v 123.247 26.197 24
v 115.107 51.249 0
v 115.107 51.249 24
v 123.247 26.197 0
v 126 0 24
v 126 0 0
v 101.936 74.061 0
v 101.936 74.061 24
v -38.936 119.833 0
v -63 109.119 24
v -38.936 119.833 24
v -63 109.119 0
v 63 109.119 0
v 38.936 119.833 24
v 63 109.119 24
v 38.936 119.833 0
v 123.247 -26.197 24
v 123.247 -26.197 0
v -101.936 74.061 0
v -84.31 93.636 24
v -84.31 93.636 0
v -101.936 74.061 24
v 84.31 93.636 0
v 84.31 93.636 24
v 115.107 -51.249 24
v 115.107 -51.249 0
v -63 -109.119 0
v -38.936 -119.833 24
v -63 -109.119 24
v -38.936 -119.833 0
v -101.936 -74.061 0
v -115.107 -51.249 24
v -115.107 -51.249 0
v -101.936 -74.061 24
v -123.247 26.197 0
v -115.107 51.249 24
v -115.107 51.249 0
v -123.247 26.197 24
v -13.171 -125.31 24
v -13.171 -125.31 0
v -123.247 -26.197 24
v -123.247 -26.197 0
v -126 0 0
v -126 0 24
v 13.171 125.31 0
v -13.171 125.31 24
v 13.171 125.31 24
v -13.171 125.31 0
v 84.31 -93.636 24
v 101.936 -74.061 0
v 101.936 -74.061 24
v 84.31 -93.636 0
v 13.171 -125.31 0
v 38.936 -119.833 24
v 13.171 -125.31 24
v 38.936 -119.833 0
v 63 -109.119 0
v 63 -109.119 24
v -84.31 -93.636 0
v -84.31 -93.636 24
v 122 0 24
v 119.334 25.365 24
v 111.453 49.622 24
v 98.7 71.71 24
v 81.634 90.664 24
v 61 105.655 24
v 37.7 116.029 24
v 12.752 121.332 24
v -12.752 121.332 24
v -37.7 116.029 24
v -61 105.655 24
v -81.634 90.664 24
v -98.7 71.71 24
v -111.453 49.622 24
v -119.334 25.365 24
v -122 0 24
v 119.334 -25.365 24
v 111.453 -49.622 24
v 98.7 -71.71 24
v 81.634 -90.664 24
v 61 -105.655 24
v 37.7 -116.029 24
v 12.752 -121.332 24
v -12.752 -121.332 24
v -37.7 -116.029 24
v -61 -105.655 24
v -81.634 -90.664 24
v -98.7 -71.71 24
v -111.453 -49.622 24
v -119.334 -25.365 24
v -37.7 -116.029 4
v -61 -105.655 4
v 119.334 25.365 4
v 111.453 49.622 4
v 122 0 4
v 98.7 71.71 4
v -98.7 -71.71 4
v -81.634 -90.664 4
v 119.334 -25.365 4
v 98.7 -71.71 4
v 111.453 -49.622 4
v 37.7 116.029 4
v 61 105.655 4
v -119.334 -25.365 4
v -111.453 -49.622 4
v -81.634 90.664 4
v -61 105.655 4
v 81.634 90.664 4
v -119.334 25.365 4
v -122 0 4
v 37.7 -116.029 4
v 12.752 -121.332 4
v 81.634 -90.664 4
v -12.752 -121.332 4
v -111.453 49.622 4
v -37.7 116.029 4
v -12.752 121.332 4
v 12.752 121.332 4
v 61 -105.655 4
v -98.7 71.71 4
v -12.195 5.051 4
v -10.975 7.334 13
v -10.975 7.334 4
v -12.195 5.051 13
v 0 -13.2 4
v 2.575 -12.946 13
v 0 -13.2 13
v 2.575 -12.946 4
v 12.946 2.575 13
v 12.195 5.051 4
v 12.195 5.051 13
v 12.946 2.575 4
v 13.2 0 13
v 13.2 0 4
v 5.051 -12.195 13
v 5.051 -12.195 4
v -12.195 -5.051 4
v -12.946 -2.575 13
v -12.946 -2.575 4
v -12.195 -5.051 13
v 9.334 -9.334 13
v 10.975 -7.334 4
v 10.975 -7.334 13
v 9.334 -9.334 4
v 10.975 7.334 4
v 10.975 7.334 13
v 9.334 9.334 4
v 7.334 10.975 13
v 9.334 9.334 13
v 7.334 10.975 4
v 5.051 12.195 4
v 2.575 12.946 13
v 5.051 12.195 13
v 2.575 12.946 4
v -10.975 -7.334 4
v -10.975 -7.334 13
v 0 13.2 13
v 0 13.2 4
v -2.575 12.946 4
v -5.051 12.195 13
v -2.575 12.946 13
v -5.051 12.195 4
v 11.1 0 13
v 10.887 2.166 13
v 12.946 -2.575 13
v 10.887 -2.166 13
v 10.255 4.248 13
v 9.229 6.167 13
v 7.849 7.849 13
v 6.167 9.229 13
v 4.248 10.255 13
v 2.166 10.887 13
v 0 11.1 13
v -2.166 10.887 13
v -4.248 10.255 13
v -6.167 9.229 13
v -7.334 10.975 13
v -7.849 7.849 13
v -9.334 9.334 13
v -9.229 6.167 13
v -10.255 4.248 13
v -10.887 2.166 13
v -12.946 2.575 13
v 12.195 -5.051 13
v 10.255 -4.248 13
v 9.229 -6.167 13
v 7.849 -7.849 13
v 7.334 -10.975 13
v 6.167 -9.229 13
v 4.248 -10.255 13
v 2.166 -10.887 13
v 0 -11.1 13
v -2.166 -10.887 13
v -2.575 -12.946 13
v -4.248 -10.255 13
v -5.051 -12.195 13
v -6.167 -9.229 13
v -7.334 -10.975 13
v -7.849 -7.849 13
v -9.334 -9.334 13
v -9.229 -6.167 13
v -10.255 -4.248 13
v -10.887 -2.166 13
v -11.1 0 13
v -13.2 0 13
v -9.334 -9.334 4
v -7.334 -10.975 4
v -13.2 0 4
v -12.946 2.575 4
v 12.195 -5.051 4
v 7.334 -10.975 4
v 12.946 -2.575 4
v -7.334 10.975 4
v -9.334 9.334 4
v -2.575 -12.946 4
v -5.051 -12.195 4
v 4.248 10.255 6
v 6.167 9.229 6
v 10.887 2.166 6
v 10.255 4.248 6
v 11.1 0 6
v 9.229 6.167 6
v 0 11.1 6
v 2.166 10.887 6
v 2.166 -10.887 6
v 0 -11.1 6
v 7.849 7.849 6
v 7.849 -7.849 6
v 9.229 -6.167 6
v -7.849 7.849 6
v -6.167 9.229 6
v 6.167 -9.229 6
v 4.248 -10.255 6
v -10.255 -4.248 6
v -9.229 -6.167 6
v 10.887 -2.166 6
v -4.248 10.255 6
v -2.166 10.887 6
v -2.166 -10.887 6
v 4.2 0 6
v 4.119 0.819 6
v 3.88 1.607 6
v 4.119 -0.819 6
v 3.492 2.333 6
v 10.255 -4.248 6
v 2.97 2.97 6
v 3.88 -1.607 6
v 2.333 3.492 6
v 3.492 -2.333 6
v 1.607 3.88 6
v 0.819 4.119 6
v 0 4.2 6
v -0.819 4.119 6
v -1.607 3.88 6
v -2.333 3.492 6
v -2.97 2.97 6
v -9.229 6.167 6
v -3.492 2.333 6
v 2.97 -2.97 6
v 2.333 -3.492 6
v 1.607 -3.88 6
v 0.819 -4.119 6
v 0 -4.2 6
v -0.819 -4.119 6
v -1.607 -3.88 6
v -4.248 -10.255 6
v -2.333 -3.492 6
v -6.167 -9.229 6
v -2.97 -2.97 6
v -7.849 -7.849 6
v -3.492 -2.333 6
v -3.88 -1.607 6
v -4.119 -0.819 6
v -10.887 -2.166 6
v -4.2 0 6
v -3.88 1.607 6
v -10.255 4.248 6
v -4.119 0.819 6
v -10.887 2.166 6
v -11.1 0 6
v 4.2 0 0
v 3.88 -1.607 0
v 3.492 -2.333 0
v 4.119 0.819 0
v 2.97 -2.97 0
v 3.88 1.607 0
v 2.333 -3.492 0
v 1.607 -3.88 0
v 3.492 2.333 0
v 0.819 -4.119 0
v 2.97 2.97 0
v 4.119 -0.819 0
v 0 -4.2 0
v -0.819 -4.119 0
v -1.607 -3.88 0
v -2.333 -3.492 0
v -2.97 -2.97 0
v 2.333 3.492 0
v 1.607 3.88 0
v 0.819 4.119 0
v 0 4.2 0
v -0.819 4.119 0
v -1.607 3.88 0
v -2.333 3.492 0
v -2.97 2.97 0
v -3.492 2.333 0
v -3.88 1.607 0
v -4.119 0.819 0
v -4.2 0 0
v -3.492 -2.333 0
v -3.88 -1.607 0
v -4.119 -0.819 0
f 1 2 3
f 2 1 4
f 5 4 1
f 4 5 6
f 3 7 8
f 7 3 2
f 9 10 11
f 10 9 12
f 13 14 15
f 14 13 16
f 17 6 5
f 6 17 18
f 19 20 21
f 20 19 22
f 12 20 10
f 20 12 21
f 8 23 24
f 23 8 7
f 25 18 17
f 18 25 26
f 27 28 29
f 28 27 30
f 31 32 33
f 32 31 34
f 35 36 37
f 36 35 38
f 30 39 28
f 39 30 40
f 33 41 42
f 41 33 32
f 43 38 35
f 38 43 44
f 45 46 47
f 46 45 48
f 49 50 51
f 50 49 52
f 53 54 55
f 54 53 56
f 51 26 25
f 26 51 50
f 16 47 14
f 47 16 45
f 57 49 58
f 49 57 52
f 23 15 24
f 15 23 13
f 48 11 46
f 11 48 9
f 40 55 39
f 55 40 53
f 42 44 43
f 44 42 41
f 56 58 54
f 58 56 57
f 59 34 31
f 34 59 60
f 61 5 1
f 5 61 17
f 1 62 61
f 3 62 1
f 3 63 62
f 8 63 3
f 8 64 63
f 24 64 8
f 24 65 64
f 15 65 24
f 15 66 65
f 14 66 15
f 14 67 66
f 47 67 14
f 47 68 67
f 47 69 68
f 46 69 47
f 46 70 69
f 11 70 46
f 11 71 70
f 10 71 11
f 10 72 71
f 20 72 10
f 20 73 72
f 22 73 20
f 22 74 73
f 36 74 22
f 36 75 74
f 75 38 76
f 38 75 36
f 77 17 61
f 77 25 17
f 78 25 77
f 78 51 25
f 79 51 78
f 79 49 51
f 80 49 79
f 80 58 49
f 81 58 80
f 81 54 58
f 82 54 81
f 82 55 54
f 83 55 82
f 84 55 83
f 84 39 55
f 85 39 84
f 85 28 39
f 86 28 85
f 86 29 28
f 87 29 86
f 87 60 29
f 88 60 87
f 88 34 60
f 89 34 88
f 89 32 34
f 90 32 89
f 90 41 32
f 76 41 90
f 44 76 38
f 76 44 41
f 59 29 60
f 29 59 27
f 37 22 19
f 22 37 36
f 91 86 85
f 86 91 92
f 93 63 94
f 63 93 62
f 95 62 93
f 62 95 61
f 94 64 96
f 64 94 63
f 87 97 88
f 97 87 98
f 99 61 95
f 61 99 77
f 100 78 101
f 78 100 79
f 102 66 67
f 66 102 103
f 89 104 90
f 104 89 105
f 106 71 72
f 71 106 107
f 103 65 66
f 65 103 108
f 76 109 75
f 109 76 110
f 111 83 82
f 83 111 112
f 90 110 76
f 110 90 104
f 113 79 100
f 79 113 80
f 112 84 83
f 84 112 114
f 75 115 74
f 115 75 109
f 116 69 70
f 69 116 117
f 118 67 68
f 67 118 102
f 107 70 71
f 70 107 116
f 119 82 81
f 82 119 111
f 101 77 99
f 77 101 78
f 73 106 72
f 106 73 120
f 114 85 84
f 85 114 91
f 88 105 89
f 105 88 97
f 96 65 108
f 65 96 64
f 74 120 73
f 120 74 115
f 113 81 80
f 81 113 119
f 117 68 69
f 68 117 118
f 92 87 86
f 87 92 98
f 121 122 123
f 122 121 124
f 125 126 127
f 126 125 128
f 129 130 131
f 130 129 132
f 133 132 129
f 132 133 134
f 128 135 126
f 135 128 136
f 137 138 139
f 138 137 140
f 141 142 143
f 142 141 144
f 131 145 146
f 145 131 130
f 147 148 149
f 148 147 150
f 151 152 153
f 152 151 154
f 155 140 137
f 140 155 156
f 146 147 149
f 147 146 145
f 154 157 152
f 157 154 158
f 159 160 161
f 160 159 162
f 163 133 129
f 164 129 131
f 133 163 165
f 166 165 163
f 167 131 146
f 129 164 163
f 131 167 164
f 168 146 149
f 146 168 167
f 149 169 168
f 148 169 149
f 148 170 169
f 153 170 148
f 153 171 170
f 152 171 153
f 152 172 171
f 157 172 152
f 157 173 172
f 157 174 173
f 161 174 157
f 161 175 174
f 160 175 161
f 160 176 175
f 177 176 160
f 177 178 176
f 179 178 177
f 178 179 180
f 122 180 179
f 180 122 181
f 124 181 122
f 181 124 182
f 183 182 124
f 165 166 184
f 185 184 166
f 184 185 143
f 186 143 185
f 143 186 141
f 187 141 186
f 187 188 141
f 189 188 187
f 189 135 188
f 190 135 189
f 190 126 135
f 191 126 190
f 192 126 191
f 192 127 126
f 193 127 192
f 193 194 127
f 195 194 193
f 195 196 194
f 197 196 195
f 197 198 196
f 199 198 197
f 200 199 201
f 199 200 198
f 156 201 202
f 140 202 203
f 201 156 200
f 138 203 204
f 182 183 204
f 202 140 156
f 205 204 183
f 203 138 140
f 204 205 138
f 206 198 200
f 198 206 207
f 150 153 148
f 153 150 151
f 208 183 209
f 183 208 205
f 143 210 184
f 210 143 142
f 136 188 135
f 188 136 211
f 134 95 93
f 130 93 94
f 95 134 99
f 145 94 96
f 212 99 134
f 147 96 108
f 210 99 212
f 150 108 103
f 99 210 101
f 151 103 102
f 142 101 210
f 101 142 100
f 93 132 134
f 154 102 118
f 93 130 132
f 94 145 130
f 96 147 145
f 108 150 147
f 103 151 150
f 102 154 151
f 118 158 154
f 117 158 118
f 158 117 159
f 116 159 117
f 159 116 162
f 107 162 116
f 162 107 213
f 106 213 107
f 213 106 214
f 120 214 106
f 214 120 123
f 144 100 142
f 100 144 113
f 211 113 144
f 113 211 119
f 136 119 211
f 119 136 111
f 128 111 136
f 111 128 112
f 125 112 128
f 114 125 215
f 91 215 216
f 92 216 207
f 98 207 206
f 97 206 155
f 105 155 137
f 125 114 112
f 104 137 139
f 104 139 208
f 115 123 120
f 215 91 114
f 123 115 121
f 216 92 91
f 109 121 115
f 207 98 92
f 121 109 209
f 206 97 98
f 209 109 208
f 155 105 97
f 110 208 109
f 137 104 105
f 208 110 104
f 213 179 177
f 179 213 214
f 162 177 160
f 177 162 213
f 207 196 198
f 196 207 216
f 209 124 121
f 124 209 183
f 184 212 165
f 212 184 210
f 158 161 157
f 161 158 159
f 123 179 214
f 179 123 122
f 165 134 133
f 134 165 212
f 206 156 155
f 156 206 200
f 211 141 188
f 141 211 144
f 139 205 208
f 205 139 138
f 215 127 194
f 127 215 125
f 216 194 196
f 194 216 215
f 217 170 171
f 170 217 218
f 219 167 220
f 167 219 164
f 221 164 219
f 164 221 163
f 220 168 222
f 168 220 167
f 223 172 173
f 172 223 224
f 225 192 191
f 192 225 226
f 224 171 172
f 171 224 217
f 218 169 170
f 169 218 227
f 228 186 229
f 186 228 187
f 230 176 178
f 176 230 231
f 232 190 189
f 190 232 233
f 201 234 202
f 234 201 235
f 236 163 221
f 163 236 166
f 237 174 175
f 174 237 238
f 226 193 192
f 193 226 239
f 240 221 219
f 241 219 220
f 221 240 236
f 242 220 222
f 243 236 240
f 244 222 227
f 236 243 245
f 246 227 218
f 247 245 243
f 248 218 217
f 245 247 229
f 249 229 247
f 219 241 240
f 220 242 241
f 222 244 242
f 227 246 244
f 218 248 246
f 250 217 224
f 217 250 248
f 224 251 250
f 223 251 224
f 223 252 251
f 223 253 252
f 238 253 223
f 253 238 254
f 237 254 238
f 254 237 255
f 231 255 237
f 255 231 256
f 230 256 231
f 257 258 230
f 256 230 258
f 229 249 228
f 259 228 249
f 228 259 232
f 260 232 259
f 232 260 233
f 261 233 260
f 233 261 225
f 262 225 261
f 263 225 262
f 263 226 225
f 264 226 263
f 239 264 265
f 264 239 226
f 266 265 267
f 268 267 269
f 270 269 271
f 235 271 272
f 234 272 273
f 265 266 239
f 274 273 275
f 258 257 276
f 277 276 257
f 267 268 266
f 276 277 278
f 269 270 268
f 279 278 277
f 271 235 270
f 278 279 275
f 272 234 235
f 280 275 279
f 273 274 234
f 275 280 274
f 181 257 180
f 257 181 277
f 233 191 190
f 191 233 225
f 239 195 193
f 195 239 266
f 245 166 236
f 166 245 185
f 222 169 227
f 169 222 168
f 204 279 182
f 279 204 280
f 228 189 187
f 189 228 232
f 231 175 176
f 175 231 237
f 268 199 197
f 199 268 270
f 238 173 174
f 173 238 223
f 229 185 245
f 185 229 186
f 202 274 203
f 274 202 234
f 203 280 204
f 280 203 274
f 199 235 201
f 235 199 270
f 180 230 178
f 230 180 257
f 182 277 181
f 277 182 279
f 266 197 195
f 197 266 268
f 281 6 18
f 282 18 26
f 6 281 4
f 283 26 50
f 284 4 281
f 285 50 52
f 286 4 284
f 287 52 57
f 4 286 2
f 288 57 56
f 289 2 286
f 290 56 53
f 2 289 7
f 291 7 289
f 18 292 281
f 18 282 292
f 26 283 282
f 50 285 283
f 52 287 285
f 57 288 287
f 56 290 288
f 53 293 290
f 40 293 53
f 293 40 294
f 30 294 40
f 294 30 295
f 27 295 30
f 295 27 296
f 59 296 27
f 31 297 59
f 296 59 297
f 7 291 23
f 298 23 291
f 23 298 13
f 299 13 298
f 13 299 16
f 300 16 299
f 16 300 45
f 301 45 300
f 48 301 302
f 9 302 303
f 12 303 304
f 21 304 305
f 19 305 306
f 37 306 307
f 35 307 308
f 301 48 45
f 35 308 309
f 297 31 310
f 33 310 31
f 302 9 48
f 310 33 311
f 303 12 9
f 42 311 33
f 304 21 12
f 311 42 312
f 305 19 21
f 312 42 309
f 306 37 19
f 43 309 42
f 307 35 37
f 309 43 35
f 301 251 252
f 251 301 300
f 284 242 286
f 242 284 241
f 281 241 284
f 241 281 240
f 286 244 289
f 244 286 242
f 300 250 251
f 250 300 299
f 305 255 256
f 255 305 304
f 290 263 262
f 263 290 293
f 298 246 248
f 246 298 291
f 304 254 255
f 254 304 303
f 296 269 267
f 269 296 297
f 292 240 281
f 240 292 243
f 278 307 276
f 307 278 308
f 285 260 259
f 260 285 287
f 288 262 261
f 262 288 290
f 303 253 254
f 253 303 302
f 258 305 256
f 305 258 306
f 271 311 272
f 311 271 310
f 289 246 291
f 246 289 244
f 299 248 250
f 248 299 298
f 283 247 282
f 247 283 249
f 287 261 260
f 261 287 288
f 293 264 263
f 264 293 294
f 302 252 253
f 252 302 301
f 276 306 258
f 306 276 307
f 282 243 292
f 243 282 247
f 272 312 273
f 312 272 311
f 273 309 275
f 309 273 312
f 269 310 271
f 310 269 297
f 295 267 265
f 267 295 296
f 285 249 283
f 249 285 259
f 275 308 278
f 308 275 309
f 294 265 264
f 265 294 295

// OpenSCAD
// file: carousel-commons.scad
module square_prism(size, p0, p1) {
    dir = p1 - p0;
    h = norm(dir);
    if (dir[0] == 0 && dir[1] == 0) {
        // no transformation necessary
        translate(p0)
        translate([0, 0, h/2])
        cube([size, size, h], center = true);
    }
    else {
        w  = dir / h;
        u0 = cross(w, [0,0,1]);
        u  = u0 / norm(u0);
        v0 = cross(w, u);
        v  = v0 / norm(v0);
        multmatrix(m=[[u[0], v[0], w[0], p0.x],
                      [u[1], v[1], w[1], p0.y],
                      [u[2], v[2], w[2], p0.z],
                      [0,    0,    0,    1]])
        translate([0, 0, h/2])
        cube([size, size, h], center = true);
    }
}

module point_plate(thickness, points) {
    hull() {
        for (i = [0 : len(points)-1]){
            translate(points[i])
            sphere(d = thickness);
        }
    }
}
// file: carousel-config.scad
// ----------------------------------------------------------------------------
// Configuration of the carousel and its components.
//
// All the values beyod "---- derived" string in each of the sections should
// not be modified manually, as they are derived from the previously defined
// parameters in some way...
// ----------------------------------------------------------------------------

// Generic parameters to address consistency & interconnections of parts.
CYL_FN = 32; // BEWARE!!! set to +- 256 for STL export!
BLEED = 0.5; // overlap for union & difference operations
EASE = 0.2; // socket/pin ease for interconnecting of parts & holes

// Core defining shape of our carousel is N-faced cylinder.
// This affects most of the subsequent parameter definitions & usage.
CAROUSEL_FACE_COUNT = 6;
CAROUSEL_ESCRIBED_RADIUS = 120;
// ---- derived
CAROUSEL_INSCRIBED_RADIUS = CAROUSEL_ESCRIBED_RADIUS * cos(180/CAROUSEL_FACE_COUNT);

// Base of the carousel -> stand that holds the axle, walls, etc.
BASE_TOTAL_HEIGHT = 24;
BASE_FLOOR_THICKNESS = 4;
BASE_WALL_THICKNESS = 4;

// Face, or, a wall of the carousel "shell".
FACE_HEIGHT = 150;
FACE_THICKNESS = 5;
// ---- derived
FACE_WIDTH = CAROUSEL_ESCRIBED_RADIUS * 2 * sin(180/CAROUSEL_FACE_COUNT);
FACE_ANGLE = (1 - 2/CAROUSEL_FACE_COUNT)*180;
FACE_APOTHEM_LEN = FACE_WIDTH / (2 * tan(180/CAROUSEL_FACE_COUNT));
FACE_DOOR_HEIGHT = 0.66 * FACE_HEIGHT;
FACE_DOOR_WIDTH = 0.75 * FACE_WIDTH;

// Roof of the carousel.
ROOF_THICKNESS = 2;
ROOF_HEIGHT = 1.3 * FACE_HEIGHT;

// Ball bearing - real-life dimensions of ball bearing used to "power" the axle.
BEARING_OUTER_D = 22;
BEARING_INNER_D = 8;
BEARING_HEIGHT = 7;
BEARING_SHELL_THICKNESS = 2;

// Axle rotating inside carousel.
AXLE_RADIUS = 4;

// Rotating rig carrying the seats.
RIG_HEIGHT = 6;
RIG_STR = 6;

// Abstract "rings" carrying seats, and their distance off the carousel center
// as a fraction of radius.
RIG_RING_POSITIONS = [0.3, 0.6, 0.9];
RIG_MAX_R = 0.90 * CAROUSEL_INSCRIBED_RADIUS;
// main file
include <carousel-config.scad>;
use <carousel-commons.scad>;

BASE_RADIUS = 1.05 * CAROUSEL_ESCRIBED_RADIUS; // to include/cover carousel walls

module _bearing_socket() {
    difference() {
        // socket body
        cylinder(h = BEARING_SHELL_THICKNESS + BEARING_HEIGHT, r = 0.5 * BEARING_OUTER_D + EASE + BEARING_SHELL_THICKNESS, $fn = CYL_FN);
        // bearing slot
        translate([0, 0, BEARING_SHELL_THICKNESS])
        cylinder(h = BEARING_HEIGHT + EASE, d = BEARING_OUTER_D + EASE, $fn = CYL_FN);
    }
}

module carousel_base() {
    color("BurlyWood")
    difference() {
        union() {
            // floor plate
            cylinder(h = BASE_FLOOR_THICKNESS, r = BASE_RADIUS);
            // rim/side wall
            edge_height = BASE_TOTAL_HEIGHT - BASE_FLOOR_THICKNESS + BLEED;
            translate([0, 0, BASE_FLOOR_THICKNESS - BLEED])
            difference() {
                cylinder(h = edge_height, r = BASE_RADIUS);
                translate([0, 0, -0.5 * BLEED])
                cylinder(h = edge_height + BLEED, r = BASE_RADIUS - BASE_WALL_THICKNESS);
            }
            // bearing socket
            assert(BASE_FLOOR_THICKNESS + BEARING_HEIGHT < BASE_TOTAL_HEIGHT, "Bearing height is too big to fit into raised base");
            translate([0, 0, BASE_FLOOR_THICKNESS])
            _bearing_socket();
        }
        translate([0, 0, -0.5 * BLEED])
        cylinder(h = BASE_TOTAL_HEIGHT + BLEED, r = AXLE_RADIUS + EASE, $fn = CYL_FN);
    }
}

module base_part(n = CAROUSEL_FACE_COUNT) {
    xx = 2 * (BASE_RADIUS + EASE);
    yy = BASE_RADIUS + 2 * EASE;
    zz = 2 * (BASE_TOTAL_HEIGHT + EASE);
    difference() {
        carousel_base();
        translate([0, -0.5*yy, 0])
            cube([xx, yy, zz], center = true);
        rotate(360/n)    
        translate([0, 0.5 * yy, 0])
            cube([xx, yy, zz], center = true);
    }
}

carousel_base();
